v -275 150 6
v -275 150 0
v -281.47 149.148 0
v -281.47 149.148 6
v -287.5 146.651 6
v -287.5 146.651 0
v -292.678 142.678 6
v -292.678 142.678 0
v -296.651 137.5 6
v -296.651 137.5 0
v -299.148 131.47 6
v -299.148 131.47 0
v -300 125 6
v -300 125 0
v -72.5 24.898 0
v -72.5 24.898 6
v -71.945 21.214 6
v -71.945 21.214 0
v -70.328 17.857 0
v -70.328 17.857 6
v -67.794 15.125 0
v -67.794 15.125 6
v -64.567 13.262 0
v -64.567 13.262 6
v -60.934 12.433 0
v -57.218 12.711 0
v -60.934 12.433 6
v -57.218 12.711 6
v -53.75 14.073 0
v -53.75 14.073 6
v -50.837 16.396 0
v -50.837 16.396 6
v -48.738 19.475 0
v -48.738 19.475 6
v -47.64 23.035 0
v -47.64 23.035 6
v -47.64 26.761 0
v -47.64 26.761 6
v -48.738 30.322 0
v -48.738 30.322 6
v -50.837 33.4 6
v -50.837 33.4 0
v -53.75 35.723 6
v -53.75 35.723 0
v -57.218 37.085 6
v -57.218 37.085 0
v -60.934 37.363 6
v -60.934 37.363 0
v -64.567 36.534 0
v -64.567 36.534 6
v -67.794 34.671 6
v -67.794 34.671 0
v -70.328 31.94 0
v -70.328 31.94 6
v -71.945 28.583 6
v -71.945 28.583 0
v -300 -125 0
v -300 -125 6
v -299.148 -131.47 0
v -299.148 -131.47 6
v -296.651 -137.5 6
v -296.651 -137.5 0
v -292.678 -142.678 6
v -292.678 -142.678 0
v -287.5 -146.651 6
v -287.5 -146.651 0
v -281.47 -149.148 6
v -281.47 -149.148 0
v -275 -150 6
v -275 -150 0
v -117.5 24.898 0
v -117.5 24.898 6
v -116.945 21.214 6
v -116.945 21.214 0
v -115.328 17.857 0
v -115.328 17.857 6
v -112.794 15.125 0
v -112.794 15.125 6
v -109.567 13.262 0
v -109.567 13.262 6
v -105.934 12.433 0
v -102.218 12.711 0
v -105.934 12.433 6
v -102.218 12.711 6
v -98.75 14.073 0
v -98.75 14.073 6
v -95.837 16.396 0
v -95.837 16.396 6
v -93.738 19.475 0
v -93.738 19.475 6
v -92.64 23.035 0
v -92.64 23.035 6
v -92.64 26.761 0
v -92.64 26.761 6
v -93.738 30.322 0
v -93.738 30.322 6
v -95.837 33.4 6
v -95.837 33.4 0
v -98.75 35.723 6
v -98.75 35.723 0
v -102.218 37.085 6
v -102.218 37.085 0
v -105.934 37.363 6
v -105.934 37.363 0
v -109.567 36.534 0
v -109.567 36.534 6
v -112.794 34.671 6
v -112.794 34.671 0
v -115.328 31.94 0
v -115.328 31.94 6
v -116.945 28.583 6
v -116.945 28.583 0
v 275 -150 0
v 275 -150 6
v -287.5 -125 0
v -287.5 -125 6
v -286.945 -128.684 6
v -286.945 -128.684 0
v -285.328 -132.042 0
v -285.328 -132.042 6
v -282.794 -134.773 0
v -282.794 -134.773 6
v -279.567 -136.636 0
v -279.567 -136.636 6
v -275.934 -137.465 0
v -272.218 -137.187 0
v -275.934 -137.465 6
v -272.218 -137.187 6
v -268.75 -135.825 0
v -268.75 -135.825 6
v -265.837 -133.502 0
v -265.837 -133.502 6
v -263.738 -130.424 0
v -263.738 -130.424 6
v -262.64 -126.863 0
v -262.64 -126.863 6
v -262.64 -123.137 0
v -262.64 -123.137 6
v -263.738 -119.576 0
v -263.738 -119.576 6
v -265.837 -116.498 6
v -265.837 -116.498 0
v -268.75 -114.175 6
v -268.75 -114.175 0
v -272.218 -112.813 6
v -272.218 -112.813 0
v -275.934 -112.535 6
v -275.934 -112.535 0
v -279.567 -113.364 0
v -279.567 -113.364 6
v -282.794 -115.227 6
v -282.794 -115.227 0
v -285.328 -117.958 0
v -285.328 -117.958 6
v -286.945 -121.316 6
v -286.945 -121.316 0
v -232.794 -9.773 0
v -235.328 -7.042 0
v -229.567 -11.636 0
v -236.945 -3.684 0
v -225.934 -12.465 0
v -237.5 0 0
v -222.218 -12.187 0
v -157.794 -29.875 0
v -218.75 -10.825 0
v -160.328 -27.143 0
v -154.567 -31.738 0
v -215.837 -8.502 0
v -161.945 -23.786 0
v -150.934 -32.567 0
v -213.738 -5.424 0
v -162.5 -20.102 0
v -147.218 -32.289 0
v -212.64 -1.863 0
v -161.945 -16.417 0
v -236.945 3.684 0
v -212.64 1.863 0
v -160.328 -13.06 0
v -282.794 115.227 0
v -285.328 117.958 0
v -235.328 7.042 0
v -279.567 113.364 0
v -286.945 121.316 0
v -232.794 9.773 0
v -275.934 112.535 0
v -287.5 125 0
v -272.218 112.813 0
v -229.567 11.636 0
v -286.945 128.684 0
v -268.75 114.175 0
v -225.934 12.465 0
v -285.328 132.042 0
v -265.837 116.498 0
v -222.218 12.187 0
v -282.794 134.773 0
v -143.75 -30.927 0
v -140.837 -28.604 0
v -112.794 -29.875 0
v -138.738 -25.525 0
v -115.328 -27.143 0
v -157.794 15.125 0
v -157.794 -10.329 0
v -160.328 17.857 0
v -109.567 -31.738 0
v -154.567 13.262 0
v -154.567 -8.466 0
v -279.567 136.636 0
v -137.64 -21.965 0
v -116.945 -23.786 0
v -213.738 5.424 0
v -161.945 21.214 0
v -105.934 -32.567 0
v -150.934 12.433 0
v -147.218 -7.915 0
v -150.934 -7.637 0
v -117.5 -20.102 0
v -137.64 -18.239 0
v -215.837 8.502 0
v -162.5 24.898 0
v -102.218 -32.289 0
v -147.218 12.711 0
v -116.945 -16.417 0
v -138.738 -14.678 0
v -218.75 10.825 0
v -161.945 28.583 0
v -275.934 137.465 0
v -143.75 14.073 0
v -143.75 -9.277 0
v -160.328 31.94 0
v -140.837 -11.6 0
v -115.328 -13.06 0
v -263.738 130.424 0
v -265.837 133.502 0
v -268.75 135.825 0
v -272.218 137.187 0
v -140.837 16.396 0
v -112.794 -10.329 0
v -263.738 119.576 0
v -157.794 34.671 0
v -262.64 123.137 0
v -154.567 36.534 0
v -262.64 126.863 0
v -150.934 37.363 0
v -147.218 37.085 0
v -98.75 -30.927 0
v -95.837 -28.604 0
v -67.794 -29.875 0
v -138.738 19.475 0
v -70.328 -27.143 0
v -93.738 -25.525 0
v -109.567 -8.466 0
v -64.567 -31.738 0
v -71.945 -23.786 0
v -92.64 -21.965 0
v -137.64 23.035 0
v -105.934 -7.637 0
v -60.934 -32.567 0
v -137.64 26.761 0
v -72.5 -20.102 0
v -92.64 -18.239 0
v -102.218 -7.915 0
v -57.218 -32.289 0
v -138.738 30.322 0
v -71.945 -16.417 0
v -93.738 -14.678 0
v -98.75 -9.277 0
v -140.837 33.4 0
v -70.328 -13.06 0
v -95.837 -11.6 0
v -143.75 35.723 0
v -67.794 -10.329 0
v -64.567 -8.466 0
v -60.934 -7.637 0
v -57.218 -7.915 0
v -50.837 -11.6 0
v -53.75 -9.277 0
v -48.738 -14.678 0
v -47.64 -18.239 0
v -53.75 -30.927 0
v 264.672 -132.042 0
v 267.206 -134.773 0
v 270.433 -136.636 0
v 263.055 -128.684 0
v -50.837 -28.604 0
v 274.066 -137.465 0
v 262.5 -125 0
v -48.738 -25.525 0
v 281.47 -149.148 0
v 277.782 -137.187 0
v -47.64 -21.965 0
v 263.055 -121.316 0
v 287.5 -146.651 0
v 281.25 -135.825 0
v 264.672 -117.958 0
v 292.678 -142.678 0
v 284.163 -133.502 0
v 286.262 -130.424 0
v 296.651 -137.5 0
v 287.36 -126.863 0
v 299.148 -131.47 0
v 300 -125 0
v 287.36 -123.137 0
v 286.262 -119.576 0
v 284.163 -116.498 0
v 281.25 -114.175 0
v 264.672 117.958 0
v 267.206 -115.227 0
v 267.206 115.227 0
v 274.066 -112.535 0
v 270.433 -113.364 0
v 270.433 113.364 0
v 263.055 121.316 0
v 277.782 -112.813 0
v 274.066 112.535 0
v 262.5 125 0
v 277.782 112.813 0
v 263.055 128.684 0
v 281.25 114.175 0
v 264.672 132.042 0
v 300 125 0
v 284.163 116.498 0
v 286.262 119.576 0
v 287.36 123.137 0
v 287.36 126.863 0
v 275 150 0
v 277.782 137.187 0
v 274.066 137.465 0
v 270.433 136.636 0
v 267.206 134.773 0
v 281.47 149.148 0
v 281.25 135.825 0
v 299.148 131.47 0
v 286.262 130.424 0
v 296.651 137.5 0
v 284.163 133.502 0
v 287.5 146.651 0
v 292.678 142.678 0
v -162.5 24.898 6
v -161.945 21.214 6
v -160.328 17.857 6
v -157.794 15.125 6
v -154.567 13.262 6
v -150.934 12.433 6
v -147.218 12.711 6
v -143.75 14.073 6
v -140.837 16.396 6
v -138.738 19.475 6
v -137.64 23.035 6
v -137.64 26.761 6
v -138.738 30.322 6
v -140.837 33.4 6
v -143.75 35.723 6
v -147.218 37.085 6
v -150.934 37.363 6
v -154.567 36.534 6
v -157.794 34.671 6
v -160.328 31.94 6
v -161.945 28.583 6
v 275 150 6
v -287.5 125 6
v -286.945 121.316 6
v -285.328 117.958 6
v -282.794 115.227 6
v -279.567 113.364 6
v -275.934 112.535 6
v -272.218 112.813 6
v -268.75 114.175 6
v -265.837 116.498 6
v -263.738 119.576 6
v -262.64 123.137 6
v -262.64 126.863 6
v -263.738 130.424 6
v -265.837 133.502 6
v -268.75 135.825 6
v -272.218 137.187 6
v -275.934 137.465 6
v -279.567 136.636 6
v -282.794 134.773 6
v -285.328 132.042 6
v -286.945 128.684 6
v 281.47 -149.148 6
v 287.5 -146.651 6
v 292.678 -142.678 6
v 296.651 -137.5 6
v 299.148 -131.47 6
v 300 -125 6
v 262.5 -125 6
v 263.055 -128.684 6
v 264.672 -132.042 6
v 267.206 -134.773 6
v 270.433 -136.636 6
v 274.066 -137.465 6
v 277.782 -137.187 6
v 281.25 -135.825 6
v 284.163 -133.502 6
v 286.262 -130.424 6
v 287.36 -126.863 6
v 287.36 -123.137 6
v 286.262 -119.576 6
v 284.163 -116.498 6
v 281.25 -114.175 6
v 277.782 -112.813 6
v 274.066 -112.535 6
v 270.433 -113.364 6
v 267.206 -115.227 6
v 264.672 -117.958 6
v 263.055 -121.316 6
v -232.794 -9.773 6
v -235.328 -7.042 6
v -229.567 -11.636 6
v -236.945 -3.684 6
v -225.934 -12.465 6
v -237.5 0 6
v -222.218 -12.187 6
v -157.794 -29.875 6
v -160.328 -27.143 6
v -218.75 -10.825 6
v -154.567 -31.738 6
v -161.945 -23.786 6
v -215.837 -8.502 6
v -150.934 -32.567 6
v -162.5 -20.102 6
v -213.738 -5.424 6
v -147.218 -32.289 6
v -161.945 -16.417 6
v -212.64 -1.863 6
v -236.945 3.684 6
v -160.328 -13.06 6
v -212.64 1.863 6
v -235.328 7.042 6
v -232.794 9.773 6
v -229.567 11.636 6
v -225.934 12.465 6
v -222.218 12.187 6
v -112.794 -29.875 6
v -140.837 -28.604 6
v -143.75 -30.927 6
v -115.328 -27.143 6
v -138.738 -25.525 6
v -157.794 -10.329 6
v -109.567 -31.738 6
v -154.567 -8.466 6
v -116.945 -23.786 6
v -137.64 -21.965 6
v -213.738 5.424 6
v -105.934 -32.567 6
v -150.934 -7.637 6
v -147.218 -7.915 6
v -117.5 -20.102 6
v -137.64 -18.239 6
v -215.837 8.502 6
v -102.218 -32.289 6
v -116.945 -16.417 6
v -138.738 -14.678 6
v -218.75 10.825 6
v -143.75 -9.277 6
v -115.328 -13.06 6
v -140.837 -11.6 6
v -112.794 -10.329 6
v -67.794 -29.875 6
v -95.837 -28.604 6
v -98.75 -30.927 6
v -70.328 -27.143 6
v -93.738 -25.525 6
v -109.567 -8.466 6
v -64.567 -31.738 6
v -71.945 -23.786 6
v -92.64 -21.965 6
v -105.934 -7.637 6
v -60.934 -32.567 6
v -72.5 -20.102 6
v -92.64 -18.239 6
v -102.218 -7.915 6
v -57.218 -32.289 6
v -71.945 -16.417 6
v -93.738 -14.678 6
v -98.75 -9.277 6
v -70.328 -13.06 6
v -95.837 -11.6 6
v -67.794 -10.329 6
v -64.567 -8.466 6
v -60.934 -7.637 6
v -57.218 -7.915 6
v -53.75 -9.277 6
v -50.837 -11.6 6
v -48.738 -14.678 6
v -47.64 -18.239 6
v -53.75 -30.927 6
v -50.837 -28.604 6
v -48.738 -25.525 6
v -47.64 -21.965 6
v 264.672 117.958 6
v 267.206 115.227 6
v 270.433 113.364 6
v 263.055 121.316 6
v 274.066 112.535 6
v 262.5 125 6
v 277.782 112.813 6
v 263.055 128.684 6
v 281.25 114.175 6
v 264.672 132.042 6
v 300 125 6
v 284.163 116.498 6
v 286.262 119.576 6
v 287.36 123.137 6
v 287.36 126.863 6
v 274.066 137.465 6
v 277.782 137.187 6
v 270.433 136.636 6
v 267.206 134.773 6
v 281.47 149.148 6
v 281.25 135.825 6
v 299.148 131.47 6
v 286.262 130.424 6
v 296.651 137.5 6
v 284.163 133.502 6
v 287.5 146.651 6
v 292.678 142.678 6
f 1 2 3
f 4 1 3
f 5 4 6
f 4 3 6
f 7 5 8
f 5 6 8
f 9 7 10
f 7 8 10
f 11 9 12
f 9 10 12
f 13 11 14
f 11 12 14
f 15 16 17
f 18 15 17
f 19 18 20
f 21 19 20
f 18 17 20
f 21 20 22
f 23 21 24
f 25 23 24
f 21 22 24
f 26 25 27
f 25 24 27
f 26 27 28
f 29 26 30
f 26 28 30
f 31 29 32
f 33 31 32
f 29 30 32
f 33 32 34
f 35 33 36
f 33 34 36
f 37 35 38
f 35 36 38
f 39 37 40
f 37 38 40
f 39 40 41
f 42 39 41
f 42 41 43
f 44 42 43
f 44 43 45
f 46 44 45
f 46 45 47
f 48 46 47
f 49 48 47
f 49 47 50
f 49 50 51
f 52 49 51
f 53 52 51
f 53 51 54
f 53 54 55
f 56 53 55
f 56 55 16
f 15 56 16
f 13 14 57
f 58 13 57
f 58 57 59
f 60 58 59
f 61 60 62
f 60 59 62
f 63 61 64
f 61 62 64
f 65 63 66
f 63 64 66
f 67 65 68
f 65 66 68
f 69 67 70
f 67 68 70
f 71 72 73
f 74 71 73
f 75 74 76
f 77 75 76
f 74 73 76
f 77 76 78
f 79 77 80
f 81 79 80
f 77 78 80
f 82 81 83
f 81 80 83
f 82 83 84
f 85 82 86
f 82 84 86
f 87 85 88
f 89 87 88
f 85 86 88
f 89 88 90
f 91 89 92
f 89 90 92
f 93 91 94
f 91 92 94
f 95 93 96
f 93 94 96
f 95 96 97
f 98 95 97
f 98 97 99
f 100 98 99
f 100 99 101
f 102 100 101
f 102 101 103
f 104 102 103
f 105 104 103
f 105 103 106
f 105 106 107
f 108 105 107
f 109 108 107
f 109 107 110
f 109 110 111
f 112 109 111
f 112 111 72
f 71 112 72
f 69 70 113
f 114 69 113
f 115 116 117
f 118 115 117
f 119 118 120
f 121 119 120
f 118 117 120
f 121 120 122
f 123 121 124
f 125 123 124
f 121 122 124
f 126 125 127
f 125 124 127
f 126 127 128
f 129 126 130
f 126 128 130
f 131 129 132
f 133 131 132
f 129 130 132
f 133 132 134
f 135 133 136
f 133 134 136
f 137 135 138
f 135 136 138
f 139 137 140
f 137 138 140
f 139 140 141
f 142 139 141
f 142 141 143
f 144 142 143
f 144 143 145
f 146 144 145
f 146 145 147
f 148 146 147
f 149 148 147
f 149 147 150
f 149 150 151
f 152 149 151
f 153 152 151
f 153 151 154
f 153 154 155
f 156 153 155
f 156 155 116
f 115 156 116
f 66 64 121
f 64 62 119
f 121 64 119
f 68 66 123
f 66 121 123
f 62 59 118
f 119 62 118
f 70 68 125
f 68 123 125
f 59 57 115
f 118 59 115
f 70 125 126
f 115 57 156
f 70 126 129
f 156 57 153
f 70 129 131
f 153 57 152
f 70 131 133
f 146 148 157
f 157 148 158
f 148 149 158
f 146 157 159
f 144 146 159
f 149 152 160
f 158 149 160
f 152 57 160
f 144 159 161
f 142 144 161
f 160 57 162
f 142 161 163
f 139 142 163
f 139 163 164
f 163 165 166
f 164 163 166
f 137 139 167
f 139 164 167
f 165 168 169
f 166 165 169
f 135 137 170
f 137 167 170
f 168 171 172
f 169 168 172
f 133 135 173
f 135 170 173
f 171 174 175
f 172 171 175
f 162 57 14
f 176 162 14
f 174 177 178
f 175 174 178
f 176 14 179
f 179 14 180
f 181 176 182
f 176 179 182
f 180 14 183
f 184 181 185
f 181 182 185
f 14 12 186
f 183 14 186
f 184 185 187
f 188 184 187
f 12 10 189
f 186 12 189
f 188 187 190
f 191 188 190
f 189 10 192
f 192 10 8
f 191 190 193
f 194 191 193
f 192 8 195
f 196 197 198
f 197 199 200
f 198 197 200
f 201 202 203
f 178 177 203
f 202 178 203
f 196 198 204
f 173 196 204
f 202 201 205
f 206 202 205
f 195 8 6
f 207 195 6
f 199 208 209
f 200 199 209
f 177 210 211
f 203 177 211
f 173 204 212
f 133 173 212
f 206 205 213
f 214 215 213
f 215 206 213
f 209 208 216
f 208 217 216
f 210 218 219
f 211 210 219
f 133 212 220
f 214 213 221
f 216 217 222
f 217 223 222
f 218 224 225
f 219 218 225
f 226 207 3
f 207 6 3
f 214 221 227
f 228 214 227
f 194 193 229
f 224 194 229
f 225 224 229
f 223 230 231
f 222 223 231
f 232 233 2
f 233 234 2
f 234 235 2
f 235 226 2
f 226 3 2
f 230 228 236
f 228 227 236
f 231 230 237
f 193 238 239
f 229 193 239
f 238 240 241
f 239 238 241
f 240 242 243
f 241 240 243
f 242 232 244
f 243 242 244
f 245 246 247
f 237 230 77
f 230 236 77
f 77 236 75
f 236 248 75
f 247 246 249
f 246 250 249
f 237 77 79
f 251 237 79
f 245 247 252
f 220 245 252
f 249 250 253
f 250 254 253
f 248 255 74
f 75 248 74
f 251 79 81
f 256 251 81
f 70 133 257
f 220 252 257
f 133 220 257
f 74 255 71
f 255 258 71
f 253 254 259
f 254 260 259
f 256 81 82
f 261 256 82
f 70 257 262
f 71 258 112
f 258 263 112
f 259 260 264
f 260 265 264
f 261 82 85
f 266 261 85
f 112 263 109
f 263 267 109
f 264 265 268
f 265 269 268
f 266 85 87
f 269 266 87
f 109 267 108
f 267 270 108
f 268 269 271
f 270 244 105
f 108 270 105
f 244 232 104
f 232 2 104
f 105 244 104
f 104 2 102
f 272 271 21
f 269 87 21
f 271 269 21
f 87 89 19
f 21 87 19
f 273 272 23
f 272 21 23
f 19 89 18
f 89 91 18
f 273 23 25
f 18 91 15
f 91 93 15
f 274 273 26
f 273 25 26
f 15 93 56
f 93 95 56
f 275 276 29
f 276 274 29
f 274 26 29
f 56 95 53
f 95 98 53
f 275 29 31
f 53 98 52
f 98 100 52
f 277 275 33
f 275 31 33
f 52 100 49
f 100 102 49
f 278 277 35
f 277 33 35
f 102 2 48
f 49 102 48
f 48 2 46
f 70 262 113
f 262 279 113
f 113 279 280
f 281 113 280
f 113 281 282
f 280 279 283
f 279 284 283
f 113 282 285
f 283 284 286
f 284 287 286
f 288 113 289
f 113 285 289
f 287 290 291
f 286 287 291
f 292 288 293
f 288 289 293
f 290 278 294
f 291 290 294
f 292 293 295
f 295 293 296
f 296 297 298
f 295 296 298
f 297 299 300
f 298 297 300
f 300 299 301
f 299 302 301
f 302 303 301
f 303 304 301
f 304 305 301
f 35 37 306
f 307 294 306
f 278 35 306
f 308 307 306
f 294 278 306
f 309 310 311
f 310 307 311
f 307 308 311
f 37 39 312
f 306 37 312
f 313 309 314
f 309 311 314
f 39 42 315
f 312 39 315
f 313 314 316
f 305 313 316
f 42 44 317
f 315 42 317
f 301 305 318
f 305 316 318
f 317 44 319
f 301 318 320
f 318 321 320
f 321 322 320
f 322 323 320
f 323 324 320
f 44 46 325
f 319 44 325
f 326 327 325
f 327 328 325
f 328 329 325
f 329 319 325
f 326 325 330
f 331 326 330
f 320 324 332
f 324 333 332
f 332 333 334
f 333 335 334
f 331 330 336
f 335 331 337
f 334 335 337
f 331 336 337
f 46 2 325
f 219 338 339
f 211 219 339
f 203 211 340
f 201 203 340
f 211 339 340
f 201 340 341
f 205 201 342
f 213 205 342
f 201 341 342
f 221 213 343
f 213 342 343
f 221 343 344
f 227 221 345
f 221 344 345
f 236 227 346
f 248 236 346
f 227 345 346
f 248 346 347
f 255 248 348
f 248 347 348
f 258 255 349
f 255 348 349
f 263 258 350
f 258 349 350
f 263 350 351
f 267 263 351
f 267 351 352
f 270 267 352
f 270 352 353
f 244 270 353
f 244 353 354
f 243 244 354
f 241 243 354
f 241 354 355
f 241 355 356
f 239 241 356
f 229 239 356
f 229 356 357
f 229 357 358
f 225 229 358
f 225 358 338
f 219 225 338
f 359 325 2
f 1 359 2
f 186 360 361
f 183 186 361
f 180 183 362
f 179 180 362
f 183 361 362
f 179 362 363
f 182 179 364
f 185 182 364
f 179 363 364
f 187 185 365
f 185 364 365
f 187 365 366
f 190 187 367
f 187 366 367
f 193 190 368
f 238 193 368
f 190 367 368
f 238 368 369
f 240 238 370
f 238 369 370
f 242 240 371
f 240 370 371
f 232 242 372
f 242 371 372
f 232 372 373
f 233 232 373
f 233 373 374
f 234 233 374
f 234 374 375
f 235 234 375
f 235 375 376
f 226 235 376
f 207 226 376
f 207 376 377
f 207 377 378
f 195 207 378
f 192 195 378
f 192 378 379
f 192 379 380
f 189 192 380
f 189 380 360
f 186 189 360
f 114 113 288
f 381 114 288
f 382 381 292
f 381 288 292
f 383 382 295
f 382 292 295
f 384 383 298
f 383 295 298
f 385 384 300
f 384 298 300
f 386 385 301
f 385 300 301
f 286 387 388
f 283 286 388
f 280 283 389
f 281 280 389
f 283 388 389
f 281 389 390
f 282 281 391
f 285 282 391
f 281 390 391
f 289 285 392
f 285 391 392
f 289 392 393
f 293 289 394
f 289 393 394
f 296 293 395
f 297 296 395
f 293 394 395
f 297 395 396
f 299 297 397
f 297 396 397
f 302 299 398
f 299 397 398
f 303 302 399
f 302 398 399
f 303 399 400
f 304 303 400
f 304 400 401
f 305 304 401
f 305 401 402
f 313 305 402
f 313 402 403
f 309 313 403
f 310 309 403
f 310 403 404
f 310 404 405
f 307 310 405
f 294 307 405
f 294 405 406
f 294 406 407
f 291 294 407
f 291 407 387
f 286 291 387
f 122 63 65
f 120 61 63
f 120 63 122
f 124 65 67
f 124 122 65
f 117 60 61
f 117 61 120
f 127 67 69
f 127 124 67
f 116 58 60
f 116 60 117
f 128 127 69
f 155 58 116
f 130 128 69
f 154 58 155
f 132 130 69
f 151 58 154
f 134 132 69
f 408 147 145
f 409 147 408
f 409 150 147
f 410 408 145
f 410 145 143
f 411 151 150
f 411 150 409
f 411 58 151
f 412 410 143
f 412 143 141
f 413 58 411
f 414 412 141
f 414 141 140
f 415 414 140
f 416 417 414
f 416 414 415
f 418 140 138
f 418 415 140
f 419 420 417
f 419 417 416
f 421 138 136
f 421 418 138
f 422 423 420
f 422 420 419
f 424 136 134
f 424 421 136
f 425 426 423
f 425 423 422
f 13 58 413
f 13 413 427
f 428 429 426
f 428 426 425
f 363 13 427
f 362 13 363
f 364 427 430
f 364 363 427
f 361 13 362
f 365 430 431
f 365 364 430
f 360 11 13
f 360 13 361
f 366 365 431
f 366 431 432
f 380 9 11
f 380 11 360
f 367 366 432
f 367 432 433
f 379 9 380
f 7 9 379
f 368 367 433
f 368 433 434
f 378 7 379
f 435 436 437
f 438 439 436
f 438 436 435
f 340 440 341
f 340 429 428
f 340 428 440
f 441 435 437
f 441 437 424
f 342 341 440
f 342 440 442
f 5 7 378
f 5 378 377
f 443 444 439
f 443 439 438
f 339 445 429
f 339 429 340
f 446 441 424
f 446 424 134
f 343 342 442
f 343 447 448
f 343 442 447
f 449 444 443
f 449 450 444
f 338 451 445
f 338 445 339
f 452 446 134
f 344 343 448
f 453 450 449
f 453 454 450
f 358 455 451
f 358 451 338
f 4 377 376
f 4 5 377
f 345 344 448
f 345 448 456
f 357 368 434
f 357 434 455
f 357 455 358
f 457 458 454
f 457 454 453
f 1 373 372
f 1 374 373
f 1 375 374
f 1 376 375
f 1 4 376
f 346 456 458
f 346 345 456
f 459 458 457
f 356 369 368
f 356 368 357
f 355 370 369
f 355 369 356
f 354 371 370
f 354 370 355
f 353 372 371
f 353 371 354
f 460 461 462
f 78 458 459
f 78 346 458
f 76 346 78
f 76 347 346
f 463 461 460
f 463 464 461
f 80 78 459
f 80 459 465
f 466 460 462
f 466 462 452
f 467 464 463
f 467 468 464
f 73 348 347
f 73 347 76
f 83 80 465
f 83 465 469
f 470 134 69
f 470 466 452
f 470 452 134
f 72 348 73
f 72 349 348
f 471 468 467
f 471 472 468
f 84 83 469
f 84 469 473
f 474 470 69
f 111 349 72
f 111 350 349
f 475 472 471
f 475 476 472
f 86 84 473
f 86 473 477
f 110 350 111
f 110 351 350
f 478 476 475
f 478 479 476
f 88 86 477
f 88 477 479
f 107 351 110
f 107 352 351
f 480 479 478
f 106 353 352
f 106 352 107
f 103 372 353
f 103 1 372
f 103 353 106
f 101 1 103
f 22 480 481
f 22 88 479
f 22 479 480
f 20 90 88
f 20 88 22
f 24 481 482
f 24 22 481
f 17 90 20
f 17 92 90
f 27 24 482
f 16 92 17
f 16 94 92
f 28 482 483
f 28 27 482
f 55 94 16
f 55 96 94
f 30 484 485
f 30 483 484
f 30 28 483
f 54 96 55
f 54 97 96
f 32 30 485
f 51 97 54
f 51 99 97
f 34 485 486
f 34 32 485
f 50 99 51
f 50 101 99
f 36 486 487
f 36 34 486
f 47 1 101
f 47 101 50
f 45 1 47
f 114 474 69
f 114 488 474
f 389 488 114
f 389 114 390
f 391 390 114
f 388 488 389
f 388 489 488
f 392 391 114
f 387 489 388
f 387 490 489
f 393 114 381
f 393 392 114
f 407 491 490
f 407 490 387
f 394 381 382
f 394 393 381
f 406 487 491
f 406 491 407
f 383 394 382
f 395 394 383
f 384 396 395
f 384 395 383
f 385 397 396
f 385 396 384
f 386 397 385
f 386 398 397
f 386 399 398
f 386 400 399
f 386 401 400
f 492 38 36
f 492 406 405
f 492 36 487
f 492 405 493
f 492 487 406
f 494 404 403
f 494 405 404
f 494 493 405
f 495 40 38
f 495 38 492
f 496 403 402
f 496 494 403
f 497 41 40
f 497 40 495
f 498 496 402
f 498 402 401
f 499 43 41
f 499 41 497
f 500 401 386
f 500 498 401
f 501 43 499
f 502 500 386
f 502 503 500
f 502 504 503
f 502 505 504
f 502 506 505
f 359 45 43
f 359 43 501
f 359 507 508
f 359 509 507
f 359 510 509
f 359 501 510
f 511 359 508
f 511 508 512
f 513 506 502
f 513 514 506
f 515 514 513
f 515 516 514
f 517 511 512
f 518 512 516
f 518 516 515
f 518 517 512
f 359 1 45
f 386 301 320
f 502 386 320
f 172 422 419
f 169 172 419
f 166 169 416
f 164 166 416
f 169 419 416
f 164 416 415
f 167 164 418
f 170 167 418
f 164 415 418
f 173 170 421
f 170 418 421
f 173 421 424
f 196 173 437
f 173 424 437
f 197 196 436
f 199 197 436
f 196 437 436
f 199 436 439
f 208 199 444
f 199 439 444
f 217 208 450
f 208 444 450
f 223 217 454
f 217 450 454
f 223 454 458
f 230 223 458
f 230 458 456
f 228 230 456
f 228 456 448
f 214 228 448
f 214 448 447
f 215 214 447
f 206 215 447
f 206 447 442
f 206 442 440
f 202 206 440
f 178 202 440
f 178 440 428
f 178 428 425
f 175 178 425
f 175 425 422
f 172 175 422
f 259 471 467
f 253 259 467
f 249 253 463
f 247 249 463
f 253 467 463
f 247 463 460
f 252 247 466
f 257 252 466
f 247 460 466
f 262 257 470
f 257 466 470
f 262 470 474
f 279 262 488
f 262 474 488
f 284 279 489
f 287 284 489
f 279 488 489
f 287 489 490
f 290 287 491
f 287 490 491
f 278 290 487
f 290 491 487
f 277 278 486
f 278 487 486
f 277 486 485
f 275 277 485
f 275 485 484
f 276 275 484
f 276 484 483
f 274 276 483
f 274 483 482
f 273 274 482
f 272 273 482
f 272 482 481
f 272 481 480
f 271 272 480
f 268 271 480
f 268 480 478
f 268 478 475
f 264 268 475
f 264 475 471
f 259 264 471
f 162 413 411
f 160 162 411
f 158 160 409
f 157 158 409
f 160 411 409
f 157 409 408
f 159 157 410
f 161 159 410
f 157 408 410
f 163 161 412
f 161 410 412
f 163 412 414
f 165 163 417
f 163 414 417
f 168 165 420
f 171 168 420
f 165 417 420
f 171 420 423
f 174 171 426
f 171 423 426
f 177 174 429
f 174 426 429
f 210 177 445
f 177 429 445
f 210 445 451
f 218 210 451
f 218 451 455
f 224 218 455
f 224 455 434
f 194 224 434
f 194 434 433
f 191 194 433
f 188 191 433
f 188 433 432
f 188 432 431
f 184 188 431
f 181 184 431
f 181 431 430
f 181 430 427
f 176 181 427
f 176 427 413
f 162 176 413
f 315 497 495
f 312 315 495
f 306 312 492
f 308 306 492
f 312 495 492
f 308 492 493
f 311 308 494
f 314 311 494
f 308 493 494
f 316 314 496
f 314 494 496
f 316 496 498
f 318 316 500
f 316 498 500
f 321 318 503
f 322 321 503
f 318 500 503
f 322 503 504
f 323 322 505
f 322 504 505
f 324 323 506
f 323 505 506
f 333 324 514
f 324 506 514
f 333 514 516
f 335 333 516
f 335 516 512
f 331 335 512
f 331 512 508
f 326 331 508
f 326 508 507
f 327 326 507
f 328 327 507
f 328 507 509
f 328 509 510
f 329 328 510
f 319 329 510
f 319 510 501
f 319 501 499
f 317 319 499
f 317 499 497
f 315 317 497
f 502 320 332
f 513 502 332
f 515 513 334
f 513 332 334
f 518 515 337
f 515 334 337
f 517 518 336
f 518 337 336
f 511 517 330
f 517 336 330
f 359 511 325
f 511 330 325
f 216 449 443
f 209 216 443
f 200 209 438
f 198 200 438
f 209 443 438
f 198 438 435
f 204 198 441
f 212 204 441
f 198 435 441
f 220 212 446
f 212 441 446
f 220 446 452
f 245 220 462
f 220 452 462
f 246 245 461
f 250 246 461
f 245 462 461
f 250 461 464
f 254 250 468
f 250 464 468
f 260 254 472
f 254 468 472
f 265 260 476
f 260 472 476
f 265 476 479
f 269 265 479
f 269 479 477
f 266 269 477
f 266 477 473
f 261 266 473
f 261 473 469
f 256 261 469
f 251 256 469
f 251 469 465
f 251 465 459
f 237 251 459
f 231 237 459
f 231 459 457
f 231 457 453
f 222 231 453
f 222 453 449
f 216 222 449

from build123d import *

# Parameters (mm, degrees)
F1_DEPTH = 6
F2_D     = 25
F3_D     = 25
F4_D     = 25
F5_D     = 25


with BuildPart() as f1:
    # F0 (on Top) → F1 (new body)
    with BuildSketch(Plane.XY):
        with BuildLine():
            Line((-275, -150), (275, -150))
            ThreePointArc((275, -150), (292.6776695297, -142.6776695297), (300, -125))
            Line((300, -125), (300, 125))
            ThreePointArc((300, 125), (292.6776695297, 142.6776695297), (275, 150))
            Line((275, 150), (-275, 150))
            ThreePointArc((-275, 150), (-292.6776695297, 142.6776695297), (-300, 125))
            Line((-300, 125), (-300, -125))
            ThreePointArc((-300, -125), (-292.6776695297, -142.6776695297), (-275, -150))
        make_face()
    extrude(amount=F1_DEPTH)

    # F2 (through all)
    with Locations(Plane(origin=(0, 0, 0), x_dir=(1, 0, 0), z_dir=(0, 0, -1))):
        with Locations((-275, 125)):
            Hole(F2_D / 2)

    # F3 (through all)
    with Locations(Plane(origin=(0, 0, 0), x_dir=(1, 0, 0), z_dir=(0, 0, -1))):
        with Locations((-275, -125), (275, 125)):
            Hole(F3_D / 2)

    # F4 (through all)
    with Locations(Plane(origin=(0, 0, 0), x_dir=(1, 0, 0), z_dir=(0, 0, -1))):
        with Locations((275, -125)):
            Hole(F4_D / 2)

    # F5 (through all)
    with Locations(Plane(origin=(0, 0, 0), x_dir=(1, 0, 0), z_dir=(0, 0, -1))):
        with Locations((-150, -24.8980756774), (-105, -24.8980756774), (-60, -24.8980756774), (-60, 20.1019243226), (-105, 20.1019243226), (-150, 20.1019243226), (-225, 0)):
            Hole(F5_D / 2)


solid = f1.part
